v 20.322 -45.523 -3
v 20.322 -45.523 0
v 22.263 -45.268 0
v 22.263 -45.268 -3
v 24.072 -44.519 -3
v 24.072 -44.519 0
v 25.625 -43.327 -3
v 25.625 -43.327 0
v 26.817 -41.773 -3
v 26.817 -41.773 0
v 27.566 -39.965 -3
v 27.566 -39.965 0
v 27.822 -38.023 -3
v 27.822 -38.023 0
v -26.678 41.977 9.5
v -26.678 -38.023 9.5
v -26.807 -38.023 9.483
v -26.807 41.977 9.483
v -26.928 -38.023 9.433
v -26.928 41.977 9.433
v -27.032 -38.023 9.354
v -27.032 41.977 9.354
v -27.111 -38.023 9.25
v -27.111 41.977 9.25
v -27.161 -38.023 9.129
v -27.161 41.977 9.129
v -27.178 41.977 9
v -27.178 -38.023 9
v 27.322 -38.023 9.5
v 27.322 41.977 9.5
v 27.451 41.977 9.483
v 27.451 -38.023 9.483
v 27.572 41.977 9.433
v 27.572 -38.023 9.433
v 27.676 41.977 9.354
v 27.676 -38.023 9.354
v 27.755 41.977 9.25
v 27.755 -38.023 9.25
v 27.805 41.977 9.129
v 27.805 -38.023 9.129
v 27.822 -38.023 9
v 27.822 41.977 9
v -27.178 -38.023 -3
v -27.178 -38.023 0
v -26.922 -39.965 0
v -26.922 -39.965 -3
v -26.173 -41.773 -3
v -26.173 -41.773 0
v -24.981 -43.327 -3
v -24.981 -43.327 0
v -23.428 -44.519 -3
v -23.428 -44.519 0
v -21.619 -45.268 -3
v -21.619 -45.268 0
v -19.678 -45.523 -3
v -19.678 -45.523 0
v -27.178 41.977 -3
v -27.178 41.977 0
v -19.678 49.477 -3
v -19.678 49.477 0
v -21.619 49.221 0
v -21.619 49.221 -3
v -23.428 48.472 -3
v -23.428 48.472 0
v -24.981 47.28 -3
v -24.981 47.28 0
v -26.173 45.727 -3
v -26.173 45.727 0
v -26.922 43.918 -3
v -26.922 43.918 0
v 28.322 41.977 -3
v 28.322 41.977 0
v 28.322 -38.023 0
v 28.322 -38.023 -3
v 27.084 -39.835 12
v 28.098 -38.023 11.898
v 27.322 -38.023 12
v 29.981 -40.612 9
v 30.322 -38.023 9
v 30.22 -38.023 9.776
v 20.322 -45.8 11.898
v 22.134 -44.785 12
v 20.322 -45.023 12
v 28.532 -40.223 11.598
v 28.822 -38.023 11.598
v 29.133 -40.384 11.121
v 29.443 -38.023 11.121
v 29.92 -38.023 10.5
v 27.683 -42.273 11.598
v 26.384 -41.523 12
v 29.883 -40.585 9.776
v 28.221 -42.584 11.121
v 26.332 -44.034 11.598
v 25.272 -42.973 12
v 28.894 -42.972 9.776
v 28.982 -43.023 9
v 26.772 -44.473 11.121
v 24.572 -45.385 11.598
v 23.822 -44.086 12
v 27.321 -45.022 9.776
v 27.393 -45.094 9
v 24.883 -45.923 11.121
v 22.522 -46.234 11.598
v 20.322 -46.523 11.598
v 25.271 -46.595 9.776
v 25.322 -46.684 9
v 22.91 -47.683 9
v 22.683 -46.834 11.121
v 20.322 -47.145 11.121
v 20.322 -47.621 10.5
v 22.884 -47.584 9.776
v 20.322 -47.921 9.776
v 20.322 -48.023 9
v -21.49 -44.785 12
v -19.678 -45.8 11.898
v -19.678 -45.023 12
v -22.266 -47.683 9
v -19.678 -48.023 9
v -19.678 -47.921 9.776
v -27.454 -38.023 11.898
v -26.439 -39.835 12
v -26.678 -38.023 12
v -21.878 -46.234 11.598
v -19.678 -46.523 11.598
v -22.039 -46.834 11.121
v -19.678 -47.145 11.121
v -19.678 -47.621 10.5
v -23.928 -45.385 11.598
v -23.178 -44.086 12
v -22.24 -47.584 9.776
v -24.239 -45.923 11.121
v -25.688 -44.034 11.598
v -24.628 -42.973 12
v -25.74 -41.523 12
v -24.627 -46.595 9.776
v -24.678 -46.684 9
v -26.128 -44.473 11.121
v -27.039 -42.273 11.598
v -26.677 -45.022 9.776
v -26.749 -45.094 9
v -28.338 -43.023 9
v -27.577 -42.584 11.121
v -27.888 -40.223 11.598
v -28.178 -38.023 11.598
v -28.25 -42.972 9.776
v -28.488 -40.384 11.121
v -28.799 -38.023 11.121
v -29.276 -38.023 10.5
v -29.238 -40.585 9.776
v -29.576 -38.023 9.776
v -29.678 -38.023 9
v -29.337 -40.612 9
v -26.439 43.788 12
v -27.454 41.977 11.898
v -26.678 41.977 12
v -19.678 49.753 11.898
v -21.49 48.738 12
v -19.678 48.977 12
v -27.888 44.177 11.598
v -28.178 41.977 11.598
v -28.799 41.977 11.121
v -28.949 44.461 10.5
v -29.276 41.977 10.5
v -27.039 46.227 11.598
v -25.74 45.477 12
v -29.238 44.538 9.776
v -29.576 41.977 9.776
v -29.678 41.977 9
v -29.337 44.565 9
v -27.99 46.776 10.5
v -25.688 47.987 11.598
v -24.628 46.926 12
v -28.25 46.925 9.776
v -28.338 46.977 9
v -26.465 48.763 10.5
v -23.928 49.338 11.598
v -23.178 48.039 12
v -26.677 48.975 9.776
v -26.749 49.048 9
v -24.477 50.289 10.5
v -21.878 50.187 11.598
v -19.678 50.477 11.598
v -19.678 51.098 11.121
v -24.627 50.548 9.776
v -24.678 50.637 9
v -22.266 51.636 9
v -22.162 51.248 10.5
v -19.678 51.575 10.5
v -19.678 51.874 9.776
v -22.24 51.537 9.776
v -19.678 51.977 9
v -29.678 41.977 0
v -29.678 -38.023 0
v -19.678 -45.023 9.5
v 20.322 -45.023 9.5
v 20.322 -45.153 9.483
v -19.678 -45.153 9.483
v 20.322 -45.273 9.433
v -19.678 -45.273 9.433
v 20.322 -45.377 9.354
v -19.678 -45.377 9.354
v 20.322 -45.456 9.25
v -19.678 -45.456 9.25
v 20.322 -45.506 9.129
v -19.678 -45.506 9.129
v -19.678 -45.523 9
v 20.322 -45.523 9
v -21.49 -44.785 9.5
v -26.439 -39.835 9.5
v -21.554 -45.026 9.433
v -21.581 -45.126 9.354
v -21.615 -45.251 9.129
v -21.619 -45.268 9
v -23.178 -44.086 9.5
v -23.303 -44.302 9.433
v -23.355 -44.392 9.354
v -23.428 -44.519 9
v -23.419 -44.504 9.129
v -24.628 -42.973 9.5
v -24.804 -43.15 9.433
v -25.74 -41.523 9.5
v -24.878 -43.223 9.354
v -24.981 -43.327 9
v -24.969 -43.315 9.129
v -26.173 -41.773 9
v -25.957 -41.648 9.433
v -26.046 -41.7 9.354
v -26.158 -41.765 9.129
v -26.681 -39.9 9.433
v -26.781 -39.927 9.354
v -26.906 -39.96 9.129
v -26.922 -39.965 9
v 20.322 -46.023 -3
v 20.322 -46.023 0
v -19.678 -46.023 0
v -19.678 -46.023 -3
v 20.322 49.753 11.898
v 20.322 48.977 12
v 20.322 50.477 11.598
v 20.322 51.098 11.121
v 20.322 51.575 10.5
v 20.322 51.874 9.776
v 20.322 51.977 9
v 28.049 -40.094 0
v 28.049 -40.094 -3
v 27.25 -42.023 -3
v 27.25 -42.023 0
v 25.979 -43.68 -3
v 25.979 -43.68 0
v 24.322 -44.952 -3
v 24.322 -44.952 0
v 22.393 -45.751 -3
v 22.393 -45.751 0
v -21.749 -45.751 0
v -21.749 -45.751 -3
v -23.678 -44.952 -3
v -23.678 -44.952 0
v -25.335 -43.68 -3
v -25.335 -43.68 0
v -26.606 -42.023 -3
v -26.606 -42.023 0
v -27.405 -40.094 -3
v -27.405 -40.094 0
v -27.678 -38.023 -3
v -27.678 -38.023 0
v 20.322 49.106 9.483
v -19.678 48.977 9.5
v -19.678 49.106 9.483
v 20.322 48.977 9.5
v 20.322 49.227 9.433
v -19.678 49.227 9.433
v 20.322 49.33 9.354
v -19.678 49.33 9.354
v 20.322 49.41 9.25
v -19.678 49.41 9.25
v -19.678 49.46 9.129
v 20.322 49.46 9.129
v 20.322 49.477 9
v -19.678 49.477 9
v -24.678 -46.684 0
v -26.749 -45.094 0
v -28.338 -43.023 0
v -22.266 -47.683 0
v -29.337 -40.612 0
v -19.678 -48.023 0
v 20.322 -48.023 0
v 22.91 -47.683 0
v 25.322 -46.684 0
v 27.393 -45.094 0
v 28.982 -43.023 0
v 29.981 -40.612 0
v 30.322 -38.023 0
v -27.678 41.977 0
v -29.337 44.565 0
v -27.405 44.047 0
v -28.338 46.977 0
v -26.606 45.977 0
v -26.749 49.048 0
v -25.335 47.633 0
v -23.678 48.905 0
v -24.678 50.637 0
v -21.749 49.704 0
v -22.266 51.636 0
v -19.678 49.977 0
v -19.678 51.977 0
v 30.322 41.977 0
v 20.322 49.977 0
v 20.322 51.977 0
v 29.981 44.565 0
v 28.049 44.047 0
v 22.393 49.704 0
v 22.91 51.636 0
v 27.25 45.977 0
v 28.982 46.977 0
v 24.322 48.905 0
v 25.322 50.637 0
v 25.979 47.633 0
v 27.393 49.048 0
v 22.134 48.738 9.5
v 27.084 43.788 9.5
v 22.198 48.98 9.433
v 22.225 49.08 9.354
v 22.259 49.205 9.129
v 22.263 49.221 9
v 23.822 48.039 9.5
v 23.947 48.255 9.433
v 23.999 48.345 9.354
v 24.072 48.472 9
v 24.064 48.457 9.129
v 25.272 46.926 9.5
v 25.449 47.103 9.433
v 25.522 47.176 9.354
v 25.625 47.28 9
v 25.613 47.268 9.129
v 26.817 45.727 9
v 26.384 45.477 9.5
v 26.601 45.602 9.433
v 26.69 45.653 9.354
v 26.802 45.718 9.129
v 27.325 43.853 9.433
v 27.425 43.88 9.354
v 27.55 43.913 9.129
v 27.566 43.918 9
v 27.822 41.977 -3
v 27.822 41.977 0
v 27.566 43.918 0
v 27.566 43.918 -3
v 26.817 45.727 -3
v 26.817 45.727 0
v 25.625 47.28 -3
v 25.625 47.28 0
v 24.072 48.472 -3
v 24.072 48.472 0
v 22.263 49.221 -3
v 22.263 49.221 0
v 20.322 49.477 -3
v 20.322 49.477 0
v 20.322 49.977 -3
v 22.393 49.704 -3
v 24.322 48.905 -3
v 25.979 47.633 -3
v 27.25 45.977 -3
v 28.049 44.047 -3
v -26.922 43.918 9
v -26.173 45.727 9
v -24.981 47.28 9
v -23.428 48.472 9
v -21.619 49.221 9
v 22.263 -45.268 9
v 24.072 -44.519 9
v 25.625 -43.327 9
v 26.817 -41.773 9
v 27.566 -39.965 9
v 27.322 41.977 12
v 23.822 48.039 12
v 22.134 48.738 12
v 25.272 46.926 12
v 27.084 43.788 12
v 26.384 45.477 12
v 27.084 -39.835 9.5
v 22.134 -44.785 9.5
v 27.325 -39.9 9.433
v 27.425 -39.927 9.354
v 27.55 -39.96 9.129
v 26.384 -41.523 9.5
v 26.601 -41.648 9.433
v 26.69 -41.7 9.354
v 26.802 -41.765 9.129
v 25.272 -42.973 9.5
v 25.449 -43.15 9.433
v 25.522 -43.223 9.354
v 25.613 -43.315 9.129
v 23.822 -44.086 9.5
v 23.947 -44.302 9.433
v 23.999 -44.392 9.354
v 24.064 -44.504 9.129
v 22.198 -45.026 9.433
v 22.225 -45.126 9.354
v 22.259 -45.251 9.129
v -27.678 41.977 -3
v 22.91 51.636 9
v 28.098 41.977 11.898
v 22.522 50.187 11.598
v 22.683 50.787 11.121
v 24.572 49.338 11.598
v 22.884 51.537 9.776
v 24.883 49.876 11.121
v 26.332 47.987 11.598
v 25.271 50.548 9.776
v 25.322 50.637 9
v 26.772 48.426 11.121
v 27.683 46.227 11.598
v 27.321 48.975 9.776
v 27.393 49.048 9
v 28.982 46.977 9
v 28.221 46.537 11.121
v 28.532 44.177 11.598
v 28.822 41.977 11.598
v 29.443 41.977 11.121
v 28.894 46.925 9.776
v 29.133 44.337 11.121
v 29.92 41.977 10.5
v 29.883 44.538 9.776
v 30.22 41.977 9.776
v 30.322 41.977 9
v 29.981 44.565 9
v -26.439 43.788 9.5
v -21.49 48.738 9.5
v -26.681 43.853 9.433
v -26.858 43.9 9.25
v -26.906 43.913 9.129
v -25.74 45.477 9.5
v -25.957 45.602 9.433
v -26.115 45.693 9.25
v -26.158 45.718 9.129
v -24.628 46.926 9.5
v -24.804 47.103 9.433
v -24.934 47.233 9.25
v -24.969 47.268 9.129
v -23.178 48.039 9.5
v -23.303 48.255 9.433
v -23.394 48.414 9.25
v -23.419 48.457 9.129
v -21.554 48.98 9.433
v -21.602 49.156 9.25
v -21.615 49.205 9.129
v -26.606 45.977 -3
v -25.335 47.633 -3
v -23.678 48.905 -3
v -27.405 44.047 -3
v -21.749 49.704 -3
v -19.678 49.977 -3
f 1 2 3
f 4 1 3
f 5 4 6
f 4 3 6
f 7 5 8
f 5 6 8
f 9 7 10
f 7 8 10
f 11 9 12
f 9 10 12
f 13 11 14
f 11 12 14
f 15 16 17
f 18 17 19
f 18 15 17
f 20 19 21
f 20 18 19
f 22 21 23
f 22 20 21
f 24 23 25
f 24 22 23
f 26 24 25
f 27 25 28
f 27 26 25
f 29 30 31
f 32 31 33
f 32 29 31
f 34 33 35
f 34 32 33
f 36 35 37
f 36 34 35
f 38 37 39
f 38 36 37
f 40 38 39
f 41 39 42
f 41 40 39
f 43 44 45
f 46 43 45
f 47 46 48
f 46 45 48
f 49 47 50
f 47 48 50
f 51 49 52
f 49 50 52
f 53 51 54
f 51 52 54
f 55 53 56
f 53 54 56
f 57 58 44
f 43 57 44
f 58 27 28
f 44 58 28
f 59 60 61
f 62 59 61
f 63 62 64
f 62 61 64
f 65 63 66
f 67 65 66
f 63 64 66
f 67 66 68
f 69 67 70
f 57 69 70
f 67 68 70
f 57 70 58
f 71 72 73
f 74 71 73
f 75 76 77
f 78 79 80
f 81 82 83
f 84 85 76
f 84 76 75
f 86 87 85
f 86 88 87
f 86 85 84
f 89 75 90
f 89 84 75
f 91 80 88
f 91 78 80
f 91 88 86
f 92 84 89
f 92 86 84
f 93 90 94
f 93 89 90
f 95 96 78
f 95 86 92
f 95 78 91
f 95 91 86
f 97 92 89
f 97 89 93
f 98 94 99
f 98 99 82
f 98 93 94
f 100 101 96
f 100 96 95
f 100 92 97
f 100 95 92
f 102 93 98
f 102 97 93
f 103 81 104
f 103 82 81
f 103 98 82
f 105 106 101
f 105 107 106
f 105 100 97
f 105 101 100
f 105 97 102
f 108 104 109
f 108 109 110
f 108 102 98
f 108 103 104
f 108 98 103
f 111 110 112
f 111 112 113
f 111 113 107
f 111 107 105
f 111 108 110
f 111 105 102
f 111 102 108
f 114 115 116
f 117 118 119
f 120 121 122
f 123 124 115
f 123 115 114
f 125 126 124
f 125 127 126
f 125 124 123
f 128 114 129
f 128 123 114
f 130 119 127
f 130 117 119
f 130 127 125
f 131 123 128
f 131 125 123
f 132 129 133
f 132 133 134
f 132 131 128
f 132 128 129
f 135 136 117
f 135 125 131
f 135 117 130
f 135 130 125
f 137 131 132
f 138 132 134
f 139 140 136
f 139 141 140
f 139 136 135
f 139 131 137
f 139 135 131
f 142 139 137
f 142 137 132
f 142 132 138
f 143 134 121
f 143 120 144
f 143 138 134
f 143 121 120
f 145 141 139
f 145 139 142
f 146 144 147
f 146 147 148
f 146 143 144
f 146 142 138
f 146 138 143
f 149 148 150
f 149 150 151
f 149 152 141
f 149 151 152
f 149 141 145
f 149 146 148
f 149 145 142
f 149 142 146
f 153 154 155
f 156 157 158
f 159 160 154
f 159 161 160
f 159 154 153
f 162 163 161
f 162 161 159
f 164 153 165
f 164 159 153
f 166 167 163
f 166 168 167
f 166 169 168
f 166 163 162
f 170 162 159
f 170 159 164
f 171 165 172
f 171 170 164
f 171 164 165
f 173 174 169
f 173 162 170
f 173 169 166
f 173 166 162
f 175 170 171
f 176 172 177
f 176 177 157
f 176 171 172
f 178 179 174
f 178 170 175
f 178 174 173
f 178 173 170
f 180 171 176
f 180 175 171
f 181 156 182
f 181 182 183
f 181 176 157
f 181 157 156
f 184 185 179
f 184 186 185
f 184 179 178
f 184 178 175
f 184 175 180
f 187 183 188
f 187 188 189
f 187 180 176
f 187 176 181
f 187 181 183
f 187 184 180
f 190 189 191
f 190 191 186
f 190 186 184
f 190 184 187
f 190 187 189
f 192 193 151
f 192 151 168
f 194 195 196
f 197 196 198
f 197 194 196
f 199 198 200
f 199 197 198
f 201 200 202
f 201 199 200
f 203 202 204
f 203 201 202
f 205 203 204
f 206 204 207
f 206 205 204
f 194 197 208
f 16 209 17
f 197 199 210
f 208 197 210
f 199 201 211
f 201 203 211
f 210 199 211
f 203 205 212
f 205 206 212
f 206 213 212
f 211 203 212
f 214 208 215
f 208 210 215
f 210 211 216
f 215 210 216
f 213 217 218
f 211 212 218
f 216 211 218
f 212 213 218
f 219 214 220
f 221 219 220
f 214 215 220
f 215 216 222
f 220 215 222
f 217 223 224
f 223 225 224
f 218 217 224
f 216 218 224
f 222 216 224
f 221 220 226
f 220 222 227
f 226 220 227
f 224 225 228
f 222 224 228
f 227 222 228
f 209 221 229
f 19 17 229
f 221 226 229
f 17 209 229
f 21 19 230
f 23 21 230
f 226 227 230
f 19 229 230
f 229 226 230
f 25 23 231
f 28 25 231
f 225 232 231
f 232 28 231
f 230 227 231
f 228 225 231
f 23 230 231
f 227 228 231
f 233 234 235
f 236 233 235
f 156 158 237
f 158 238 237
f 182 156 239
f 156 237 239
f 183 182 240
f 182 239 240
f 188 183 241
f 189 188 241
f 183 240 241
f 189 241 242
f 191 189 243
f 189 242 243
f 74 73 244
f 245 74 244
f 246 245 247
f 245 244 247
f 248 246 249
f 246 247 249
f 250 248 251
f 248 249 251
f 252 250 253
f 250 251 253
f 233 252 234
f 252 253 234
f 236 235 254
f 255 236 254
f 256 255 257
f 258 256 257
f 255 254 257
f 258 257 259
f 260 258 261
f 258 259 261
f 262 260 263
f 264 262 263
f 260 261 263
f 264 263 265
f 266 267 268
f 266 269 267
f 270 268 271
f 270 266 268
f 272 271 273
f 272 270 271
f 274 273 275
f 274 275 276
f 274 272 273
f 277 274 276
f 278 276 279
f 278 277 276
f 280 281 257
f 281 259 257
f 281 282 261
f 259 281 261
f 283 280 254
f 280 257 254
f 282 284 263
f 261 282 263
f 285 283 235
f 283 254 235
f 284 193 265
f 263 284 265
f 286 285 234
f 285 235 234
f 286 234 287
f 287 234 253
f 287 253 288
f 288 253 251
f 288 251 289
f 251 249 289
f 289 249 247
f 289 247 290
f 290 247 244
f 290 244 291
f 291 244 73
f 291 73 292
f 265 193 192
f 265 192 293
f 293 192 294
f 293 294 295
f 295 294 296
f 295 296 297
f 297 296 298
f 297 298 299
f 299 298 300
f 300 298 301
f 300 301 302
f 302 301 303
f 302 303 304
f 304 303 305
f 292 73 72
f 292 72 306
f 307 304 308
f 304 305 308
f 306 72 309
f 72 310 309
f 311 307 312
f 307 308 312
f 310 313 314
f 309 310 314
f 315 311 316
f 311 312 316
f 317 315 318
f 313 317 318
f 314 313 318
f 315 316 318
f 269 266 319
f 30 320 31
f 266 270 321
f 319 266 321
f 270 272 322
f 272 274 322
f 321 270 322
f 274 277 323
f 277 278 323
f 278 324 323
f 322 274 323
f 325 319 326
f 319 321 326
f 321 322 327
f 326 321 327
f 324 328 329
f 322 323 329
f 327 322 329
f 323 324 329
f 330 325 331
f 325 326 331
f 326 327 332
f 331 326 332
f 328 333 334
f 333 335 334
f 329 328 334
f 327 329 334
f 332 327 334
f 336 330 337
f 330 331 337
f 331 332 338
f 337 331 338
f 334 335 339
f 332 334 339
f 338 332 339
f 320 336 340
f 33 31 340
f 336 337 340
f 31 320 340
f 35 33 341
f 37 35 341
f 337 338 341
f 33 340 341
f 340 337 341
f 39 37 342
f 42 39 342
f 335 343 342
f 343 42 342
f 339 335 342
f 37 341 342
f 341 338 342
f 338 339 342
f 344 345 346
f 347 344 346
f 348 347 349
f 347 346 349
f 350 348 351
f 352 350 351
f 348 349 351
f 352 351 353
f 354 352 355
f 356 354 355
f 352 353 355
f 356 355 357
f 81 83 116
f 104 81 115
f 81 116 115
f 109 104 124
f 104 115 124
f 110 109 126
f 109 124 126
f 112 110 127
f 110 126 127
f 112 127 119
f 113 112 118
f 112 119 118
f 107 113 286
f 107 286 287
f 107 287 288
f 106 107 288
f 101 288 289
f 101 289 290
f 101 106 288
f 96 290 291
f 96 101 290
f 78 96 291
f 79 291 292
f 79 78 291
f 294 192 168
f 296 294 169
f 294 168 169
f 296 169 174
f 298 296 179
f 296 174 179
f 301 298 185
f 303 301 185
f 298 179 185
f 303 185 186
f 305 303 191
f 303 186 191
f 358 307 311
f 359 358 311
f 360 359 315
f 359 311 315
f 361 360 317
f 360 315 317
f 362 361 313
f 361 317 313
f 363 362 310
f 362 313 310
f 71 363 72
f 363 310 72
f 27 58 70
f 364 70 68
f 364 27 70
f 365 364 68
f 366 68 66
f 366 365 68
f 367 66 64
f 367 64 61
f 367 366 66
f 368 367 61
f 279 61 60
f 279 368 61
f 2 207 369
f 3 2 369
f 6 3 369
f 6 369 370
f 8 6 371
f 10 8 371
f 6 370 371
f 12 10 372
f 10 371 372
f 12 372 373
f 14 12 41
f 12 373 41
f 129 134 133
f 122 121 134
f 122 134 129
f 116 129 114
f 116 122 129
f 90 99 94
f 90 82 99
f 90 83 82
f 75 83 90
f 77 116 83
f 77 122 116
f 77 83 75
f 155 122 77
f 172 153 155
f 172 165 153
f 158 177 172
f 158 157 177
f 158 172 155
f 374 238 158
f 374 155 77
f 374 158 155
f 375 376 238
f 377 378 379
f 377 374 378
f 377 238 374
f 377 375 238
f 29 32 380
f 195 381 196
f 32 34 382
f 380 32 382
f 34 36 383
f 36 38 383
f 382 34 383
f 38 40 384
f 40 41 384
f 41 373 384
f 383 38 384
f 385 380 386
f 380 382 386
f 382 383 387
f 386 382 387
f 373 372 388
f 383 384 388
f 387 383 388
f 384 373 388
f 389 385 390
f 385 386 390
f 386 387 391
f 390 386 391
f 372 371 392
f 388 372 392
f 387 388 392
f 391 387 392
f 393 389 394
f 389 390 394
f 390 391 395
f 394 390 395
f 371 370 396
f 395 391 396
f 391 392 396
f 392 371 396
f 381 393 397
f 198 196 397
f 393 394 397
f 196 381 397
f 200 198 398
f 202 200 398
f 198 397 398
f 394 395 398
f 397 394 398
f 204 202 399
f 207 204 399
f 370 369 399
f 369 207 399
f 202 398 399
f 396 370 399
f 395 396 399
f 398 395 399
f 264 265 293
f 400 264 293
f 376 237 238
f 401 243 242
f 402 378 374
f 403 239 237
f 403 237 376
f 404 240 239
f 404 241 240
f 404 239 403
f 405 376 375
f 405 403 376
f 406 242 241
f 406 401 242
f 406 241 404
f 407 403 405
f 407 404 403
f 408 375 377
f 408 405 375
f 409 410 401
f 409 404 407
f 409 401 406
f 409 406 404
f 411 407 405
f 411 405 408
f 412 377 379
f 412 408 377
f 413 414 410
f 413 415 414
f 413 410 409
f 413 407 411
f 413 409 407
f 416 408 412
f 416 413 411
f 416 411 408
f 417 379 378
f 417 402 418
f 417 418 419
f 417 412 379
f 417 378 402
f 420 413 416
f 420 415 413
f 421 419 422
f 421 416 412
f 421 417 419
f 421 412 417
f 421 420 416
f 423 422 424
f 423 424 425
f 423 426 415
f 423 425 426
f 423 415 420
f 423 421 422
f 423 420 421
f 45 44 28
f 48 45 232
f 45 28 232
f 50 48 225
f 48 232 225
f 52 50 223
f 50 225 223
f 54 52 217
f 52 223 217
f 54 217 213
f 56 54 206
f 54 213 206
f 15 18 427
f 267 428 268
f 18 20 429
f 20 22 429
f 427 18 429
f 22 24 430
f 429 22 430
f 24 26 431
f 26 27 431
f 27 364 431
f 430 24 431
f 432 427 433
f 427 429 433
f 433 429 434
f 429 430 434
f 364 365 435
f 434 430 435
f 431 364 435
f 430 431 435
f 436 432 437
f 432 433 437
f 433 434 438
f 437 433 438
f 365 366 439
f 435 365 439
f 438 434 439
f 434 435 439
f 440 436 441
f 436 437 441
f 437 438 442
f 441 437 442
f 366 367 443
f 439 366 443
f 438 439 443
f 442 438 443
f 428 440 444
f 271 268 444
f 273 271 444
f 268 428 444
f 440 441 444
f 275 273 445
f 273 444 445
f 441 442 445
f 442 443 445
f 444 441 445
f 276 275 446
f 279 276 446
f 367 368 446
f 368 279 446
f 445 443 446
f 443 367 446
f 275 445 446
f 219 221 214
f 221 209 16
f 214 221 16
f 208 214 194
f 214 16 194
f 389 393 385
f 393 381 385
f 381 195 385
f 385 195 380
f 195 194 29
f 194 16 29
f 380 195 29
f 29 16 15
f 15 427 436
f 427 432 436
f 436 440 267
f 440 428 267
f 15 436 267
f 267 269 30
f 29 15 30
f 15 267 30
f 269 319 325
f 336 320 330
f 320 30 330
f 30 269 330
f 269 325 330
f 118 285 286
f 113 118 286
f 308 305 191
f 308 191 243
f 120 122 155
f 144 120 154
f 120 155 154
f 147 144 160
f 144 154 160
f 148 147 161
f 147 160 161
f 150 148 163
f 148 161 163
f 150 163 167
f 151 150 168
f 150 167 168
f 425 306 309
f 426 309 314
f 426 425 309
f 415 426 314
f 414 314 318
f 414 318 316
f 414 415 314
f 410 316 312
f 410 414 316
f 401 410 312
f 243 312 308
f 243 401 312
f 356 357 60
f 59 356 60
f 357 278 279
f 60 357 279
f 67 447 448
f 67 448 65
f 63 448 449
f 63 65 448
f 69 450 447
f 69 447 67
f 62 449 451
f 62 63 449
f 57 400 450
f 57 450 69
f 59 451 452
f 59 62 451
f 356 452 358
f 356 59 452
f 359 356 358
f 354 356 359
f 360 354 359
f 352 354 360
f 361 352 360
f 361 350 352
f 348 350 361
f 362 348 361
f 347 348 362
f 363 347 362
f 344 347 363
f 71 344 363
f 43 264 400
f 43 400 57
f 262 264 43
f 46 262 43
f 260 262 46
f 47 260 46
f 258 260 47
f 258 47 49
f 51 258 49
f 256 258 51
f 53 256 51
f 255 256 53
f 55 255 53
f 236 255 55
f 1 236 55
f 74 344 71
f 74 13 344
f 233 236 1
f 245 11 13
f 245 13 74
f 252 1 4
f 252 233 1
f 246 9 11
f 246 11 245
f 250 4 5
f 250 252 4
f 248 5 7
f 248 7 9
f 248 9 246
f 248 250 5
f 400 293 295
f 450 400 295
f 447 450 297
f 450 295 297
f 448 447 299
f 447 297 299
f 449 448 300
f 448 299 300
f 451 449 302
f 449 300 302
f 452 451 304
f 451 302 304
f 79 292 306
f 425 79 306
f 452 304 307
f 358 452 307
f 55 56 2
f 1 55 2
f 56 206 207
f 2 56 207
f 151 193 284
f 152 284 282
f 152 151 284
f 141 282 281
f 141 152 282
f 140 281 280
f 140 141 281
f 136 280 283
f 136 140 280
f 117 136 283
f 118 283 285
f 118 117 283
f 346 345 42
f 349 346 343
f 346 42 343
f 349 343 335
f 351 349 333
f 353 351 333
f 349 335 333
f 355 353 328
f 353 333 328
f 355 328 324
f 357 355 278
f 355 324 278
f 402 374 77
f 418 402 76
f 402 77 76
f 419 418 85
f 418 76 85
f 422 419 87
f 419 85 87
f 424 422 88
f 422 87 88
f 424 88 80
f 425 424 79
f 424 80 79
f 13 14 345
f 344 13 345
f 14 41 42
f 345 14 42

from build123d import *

# Parameters (mm, degrees)
F0_W     = 60
F0_H     = 100
F1_DEPTH = 12
F2_R     = 10
F3_R     = 3
F4_T     = -2.5
F6_DEPTH = 3


with BuildPart() as f1:
    # F0 (on Top) → F1 (new body)
    with BuildSketch(Plane.XY):
        with Locations((0.322031, 1.976583)):
            Rectangle(F0_W, F0_H)
    extrude(amount=F1_DEPTH)

    # F2
    f2_edges = [f1.edges().sort_by_distance(p)[0] for p in [
        (-29.677969, -48.023417, 6),
        (-29.677969, 51.976583, 6),
        (30.322031, -48.023417, 6),
        (30.322031, 51.976583, 6),
    ]]
    fillet(f2_edges, radius=F2_R)

    # F3
    f3_edges = [f1.edges().sort_by_distance(p)[0] for p in [
        (0.322031, 51.976583, 12),
    ]]
    fillet(f3_edges, radius=F3_R)

    # F4
    f4_openings = [f1.faces().sort_by_distance(p)[0] for p in [
        (0.322031, 1.976583, 0),
    ]]
    offset(amount=F4_T, openings=f4_openings)

    # F5 (on face) → F6 (join)
    with BuildSketch(Plane(origin=(0, 0, 0), x_dir=(1, 0, 0), z_dir=(0, 0, -1))):
        with BuildLine():
            Line((-27.677969, 38.023417), (-27.677969, -41.976583))
            ThreePointArc((-27.677969, -41.976583), (-25.334823, -47.633437), (-19.677969, -49.976583))
            Line((-19.677969, -49.976583), (20.322031, -49.976583))
            ThreePointArc((20.322031, -49.976583), (25.978885, -47.633437), (28.322031, -41.976583))
            Line((28.322031, -41.976583), (28.322031, 38.023417))
            ThreePointArc((28.322031, 38.023417), (25.978885, 43.680271), (20.322031, 46.023417))
            Line((20.322031, 46.023417), (-19.677969, 46.023417))
            ThreePointArc((-19.677969, 46.023417), (-25.334823, 43.680271), (-27.677969, 38.023417))
        make_face()
        with BuildLine():
            ThreePointArc((-19.677969, -49.476583), (-24.98127, -47.279884), (-27.177969, -41.976583))
            Line((-27.177969, -41.976583), (-27.177969, 38.023417))
            ThreePointArc((-27.177969, 38.023417), (-24.98127, 43.326718), (-19.677969, 45.523417))
            Line((-19.677969, 45.523417), (20.322031, 45.523417))
            ThreePointArc((20.322031, 45.523417), (25.625332, 43.326718), (27.822031, 38.023417))
            Line((27.822031, 38.023417), (27.822031, -41.976583))
            ThreePointArc((27.822031, -41.976583), (25.625332, -47.279884), (20.322031, -49.476583))
            Line((20.322031, -49.476583), (-19.677969, -49.476583))
        make_face(mode=Mode.SUBTRACT)
    extrude(amount=F6_DEPTH)


solid = f1.part
